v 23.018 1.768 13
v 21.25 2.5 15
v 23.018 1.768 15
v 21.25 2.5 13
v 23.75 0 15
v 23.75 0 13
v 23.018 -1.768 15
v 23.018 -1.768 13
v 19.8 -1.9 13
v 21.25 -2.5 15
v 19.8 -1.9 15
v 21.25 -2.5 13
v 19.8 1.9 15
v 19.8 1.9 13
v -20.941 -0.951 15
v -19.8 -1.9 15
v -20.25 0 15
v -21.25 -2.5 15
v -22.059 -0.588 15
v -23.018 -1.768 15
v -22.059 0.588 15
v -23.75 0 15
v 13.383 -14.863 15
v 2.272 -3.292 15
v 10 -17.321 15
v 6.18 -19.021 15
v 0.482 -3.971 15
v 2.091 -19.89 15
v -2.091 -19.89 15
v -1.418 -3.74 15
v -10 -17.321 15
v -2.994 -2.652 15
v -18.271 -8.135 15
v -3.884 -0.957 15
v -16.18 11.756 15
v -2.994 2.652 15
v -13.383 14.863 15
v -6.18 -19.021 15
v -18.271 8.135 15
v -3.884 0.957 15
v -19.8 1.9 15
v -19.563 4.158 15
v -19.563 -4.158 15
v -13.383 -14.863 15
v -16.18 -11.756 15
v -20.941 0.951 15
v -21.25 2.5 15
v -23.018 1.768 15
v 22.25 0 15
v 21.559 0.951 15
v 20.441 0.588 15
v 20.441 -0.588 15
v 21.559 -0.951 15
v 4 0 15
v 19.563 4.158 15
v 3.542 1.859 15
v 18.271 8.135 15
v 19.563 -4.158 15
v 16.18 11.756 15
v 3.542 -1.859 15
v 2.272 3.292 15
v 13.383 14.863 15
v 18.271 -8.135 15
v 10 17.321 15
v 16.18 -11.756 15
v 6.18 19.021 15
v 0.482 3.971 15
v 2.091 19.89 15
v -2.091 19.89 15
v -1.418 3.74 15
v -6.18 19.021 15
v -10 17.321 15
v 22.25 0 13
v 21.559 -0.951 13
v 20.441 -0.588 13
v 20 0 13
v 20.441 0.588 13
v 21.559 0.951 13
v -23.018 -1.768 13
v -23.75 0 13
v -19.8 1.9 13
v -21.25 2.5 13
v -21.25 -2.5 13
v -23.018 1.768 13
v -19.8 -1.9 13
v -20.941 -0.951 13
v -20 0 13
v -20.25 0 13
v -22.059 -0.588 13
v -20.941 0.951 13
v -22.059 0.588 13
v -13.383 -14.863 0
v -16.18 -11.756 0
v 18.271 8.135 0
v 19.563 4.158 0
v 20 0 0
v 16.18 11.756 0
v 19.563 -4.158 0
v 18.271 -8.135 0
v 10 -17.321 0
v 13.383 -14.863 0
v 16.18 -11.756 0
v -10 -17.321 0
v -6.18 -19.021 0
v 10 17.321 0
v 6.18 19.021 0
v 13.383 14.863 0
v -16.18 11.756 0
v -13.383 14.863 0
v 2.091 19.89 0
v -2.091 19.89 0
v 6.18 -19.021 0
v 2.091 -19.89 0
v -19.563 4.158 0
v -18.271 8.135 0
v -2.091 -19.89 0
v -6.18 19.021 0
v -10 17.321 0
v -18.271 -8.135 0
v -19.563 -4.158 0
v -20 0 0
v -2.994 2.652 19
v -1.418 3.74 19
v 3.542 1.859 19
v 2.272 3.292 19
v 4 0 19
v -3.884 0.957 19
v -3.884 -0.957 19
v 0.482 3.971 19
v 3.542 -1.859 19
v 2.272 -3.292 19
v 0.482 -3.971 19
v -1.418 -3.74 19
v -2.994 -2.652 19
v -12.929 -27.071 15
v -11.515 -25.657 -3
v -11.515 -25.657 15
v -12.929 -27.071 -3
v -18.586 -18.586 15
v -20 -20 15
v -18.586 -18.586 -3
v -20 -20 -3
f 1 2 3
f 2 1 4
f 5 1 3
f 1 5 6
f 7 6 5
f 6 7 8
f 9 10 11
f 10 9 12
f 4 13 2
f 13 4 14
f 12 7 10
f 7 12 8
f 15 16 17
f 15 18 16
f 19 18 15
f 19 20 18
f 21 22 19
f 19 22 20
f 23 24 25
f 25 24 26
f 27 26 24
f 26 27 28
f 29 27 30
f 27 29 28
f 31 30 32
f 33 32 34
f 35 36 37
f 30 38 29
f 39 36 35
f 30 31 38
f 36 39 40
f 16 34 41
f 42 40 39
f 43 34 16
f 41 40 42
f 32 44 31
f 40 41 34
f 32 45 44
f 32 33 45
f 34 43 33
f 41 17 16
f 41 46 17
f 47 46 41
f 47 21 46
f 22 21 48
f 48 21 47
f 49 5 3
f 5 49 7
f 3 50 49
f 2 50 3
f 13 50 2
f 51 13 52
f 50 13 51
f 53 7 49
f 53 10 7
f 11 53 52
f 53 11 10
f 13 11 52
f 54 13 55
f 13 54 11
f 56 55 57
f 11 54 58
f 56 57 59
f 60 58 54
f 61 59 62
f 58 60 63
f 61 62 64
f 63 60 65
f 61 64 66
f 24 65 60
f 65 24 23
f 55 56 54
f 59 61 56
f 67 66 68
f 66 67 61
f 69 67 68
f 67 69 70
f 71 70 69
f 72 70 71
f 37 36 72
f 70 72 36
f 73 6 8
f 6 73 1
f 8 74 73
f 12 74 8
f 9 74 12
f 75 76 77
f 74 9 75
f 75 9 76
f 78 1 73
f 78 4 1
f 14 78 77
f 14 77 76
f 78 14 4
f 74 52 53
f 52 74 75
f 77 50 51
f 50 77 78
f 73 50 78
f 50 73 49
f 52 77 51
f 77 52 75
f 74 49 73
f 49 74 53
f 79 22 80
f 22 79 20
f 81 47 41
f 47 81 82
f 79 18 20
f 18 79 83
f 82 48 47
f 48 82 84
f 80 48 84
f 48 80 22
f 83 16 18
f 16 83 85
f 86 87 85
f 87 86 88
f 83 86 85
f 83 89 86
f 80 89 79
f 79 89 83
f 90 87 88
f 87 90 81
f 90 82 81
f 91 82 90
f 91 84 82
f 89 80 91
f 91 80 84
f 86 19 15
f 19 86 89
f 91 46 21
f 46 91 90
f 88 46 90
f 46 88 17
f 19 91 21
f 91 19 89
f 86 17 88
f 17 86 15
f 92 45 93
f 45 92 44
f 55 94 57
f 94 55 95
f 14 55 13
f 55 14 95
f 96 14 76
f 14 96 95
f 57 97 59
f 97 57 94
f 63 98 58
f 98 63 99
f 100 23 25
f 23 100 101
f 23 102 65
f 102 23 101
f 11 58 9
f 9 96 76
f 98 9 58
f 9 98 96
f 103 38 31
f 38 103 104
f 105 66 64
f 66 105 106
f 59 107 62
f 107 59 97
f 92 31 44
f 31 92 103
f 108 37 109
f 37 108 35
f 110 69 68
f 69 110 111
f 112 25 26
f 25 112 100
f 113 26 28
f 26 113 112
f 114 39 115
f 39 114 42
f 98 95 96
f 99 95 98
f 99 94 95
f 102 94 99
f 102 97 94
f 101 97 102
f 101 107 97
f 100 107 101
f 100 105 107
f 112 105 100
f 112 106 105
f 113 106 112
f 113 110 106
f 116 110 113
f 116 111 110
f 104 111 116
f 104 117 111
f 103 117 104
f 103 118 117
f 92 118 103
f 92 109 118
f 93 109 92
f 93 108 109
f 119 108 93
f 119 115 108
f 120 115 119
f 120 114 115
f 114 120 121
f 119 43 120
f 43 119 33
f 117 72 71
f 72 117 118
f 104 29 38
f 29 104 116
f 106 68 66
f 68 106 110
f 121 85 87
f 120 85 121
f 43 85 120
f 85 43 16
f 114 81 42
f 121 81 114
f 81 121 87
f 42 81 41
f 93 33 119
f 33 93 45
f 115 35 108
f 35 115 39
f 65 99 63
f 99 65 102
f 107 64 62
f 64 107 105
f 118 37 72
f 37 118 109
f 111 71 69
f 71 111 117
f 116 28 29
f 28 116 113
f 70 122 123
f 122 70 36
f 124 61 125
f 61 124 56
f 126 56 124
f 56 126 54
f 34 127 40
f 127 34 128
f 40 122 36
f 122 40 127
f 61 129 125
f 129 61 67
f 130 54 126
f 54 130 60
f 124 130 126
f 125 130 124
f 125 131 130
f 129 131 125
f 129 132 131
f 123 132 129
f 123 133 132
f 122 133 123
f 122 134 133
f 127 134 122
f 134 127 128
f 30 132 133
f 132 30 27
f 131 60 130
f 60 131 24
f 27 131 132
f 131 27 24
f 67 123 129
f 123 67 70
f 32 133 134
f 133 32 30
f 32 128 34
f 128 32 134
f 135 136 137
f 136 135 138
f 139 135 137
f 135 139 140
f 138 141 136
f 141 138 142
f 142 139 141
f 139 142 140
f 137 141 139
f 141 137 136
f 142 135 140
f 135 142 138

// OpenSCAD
epsilon = 0.1;

idle_radius =  10;
idle_width  = 100;
idle_depth  =  50;
idle_height =  35;

stepper_height            = 15;
stepper_radius            = 20;
stepper_screw_hole_radius = 1;
stepper_screw_flap_height = 2;
stepper_screw_flap_radius = stepper_screw_hole_radius+1.5;
stepper_gear_radius       = 4;
stepper_gear_height       = 4;



// idler();
// motor_height =
//   idle_height
//   - stepper_height
//   + stepper_screw_flap_height
//   + epsilon;
// translate([-5, 0, motor_height])
//   rotate(-45)
//     stepper();


stepper();
translate([-stepper_radius,-stepper_radius,-stepper_height*1/5])
  rotate([0,0,-45])
    cube([10,2,stepper_height+stepper_height*1/5]);

module stepper() {
  color("gold")
    translate([0,0,stepper_height])
      cylinder(r=stepper_gear_radius, h=stepper_gear_height);
  color("silver") {
    cylinder(r=stepper_radius, h=stepper_height);
    translate([stepper_radius+stepper_screw_flap_radius/2,
               0,
               stepper_height-stepper_screw_flap_height])
      stepper_flap();
    translate([-stepper_radius-stepper_screw_flap_radius/2,
               0,
               stepper_height-stepper_screw_flap_height])
      stepper_flap();
  }
}

module stepper_flap() {
  difference() {
    cylinder(r=stepper_screw_flap_radius,
             h=stepper_screw_flap_height);
    cylinder(r=stepper_screw_hole_radius,
             h=stepper_screw_flap_height*4,
             center=true);
  }
}

module idler() {
   difference() {
     linear_extrude(idle_height, $fn=10)
       offset(5)
         circle(40,$fn=3);
     for (a=[45,180,315]) {
       translate([0,0,-5])
         rotate(a)
           rotate(90,[0,1,0])
           cylinder(r=20,h=50,$fn=10);
     }
   }
}
